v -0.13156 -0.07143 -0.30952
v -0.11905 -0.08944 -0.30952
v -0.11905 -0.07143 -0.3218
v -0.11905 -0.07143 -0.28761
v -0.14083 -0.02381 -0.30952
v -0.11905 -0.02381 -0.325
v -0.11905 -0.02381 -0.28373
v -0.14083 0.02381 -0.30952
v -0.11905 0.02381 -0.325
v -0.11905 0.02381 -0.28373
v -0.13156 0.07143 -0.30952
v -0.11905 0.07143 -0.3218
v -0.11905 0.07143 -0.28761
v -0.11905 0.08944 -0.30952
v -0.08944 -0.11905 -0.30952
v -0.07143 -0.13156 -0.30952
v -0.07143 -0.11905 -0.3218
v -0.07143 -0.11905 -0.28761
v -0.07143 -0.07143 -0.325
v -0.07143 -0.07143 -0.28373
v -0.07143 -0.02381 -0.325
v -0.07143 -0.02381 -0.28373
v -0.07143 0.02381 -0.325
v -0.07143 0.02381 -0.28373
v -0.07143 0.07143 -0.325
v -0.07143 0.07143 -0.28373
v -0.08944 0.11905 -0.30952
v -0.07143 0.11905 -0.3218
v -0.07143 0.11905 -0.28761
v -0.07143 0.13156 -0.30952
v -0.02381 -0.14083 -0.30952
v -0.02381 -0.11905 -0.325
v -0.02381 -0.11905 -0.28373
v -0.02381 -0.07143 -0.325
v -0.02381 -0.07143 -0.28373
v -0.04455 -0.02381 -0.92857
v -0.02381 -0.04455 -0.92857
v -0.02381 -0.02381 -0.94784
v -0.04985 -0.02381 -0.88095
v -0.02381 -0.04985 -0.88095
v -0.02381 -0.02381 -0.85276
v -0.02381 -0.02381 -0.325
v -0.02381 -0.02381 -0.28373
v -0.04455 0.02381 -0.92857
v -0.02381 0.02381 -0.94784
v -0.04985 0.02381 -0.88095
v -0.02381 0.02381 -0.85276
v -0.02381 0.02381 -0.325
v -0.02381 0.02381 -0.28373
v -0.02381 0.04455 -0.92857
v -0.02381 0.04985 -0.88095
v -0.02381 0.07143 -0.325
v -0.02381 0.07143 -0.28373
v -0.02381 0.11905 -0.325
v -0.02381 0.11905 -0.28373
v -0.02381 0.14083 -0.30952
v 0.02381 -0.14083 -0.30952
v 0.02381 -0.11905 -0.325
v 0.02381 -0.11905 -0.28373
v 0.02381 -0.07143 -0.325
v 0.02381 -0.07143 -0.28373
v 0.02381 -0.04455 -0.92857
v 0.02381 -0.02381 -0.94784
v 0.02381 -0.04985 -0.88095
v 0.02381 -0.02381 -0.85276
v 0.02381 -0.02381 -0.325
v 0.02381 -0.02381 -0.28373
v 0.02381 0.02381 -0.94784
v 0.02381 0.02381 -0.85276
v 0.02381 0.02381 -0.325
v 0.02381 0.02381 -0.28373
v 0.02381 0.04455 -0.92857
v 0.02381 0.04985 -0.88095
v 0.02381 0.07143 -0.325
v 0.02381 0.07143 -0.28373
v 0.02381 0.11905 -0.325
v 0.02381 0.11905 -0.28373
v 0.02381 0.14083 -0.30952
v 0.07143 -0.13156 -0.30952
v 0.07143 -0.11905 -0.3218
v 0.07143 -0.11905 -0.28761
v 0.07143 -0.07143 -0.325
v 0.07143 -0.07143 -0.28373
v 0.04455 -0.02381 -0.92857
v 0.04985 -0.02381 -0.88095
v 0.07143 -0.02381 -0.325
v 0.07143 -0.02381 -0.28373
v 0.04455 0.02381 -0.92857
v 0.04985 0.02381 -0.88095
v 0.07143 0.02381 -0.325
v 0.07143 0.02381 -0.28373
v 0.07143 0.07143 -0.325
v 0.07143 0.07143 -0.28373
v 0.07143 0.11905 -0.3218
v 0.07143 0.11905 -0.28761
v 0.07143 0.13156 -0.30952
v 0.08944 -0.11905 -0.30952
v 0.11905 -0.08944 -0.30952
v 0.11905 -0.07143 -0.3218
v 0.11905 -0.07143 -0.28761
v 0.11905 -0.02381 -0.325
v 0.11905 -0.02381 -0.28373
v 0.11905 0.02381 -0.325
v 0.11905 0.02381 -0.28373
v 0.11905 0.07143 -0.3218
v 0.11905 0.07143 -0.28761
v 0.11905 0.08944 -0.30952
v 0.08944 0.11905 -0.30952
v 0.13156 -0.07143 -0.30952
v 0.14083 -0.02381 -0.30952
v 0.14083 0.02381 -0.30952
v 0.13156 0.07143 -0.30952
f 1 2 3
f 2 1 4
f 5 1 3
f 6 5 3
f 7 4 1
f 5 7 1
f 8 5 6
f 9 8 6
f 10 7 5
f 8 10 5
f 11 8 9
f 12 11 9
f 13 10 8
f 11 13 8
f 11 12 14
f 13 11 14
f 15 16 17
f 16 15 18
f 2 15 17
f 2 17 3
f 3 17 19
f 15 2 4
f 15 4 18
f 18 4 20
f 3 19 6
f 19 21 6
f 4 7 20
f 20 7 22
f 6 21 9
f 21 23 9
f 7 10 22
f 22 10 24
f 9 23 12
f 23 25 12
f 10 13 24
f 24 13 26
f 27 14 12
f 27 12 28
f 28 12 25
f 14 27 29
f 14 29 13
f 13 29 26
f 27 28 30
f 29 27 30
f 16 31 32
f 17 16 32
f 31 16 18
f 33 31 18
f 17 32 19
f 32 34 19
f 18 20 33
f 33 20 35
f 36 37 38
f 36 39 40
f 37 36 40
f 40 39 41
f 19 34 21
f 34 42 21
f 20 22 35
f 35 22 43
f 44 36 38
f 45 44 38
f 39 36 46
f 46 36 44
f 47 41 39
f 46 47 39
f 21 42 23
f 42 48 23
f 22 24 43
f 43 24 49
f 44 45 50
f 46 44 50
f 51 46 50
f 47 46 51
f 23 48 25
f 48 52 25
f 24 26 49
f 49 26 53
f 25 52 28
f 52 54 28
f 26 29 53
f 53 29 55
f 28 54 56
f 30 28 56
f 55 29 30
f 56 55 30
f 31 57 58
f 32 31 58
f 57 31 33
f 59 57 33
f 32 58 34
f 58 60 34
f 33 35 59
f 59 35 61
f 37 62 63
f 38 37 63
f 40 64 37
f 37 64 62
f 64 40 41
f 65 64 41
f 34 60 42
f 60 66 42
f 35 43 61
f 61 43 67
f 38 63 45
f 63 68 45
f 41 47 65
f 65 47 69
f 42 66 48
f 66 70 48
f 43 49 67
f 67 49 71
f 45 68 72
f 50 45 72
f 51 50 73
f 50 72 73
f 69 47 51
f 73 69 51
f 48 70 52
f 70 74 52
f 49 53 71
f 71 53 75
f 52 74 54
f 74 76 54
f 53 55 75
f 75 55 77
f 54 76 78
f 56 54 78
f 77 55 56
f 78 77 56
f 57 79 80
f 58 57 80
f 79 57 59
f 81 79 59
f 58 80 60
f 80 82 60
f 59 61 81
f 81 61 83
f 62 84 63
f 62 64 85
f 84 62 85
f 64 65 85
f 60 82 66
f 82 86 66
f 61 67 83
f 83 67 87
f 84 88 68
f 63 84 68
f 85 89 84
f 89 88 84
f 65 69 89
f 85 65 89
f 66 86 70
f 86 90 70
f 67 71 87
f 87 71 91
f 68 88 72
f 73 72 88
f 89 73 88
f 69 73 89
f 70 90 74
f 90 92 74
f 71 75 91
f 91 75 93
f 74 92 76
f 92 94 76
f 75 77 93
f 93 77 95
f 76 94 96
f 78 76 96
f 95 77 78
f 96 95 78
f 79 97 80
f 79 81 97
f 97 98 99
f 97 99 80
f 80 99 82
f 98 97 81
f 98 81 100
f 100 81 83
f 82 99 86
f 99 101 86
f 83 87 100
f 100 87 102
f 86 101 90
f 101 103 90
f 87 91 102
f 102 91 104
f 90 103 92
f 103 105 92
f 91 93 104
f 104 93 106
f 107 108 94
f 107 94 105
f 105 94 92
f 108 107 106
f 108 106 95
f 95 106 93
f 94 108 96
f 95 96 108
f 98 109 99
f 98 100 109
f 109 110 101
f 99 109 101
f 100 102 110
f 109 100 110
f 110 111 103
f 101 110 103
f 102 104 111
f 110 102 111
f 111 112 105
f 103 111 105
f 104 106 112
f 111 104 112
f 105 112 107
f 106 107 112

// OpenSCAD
polyhedron(points=[
[-0.1315618242536274,-0.07142857142857162,-0.30952380952380953],
[-0.11904761904761907,-0.08943948291596926,-0.30952380952380953],
[-0.11904761904761907,-0.07142857142857162,-0.32180259341285344],
[-0.11904761904761907,-0.07142857142857162,-0.28760564894903284],
[-0.14082872299920957,-0.023809523809523947,-0.30952380952380953],
[-0.11904761904761907,-0.023809523809523947,-0.32500003633045016],
[-0.11904761904761907,-0.023809523809523947,-0.28373018900553393],
[-0.14082872299920957,0.023809523809523725,-0.30952380952380953],
[-0.11904761904761907,0.023809523809523725,-0.32500003633045016],
[-0.11904761904761907,0.023809523809523725,-0.28373018900553393],
[-0.1315618242536274,0.0714285714285714,-0.30952380952380953],
[-0.11904761904761907,0.0714285714285714,-0.32180259341285344],
[-0.11904761904761907,0.0714285714285714,-0.28760564894903284],
[-0.11904761904761907,0.08943957374209432,-0.30952380952380953],
[-0.08943948291596926,-0.11904761904761907,-0.30952380952380953],
[-0.07142857142857162,-0.1315618242536274,-0.30952380952380953],
[-0.07142857142857162,-0.11904761904761907,-0.32180259341285344],
[-0.07142857142857162,-0.11904761904761907,-0.28760564894903284],
[-0.07142857142857162,-0.07142857142857162,-0.32500003633045016],
[-0.07142857142857162,-0.07142857142857162,-0.28373018900553393],
[-0.07142857142857162,-0.023809523809523947,-0.32500003633045016],
[-0.07142857142857162,-0.023809523809523947,-0.28373018900553393],
[-0.07142857142857162,0.023809523809523725,-0.32500003633045016],
[-0.07142857142857162,0.023809523809523725,-0.28373018900553393],
[-0.07142857142857162,0.0714285714285714,-0.32500003633045016],
[-0.07142857142857162,0.0714285714285714,-0.28373018900553393],
[-0.08943948291596926,0.11904761904761907,-0.30952380952380953],
[-0.07142857142857162,0.11904761904761907,-0.32180259341285344],
[-0.07142857142857162,0.11904761904761907,-0.28760564894903284],
[-0.07142857142857162,0.13156182425362717,-0.30952380952380953],
[-0.023809523809523947,-0.14082872299920957,-0.30952380952380953],
[-0.023809523809523947,-0.11904761904761907,-0.32500003633045016],
[-0.023809523809523947,-0.11904761904761907,-0.28373018900553393],
[-0.023809523809523947,-0.07142857142857162,-0.32500003633045016],
[-0.023809523809523947,-0.07142857142857162,-0.28373018900553393],
[-0.04454803466796875,-0.023809523809523947,-0.9285714285714286],
[-0.023809523809523947,-0.04454803466796875,-0.9285714285714286],
[-0.023809523809523947,-0.023809523809523947,-0.9478431883312407],
[-0.0498484656924294,-0.023809523809523947,-0.8809523809523809],
[-0.023809523809523947,-0.0498484656924294,-0.8809523809523809],
[-0.023809523809523947,-0.023809523809523947,-0.8527604057675316],
[-0.023809523809523947,-0.023809523809523947,-0.32500003633045016],
[-0.023809523809523947,-0.023809523809523947,-0.28373018900553393],
[-0.04454803466796875,0.023809523809523725,-0.9285714285714286],
[-0.023809523809523947,0.023809523809523725,-0.9478431883312407],
[-0.0498484656924294,0.023809523809523725,-0.8809523809523809],
[-0.023809523809523947,0.023809523809523725,-0.8527604057675316],
[-0.023809523809523947,0.023809523809523725,-0.32500003633045016],
[-0.023809523809523947,0.023809523809523725,-0.28373018900553393],
[-0.023809523809523947,0.04454803466796875,-0.9285714285714286],
[-0.023809523809523947,0.04984846569242918,-0.8809523809523809],
[-0.023809523809523947,0.0714285714285714,-0.32500003633045016],
[-0.023809523809523947,0.0714285714285714,-0.28373018900553393],
[-0.023809523809523947,0.11904761904761907,-0.32500003633045016],
[-0.023809523809523947,0.11904761904761907,-0.28373018900553393],
[-0.023809523809523947,0.14082863217308406,-0.30952380952380953],
[0.023809523809523725,-0.14082872299920957,-0.30952380952380953],
[0.023809523809523725,-0.11904761904761907,-0.32500003633045016],
[0.023809523809523725,-0.11904761904761907,-0.28373018900553393],
[0.023809523809523725,-0.07142857142857162,-0.32500003633045016],
[0.023809523809523725,-0.07142857142857162,-0.28373018900553393],
[0.023809523809523725,-0.04454803466796875,-0.9285714285714286],
[0.023809523809523725,-0.023809523809523947,-0.9478431883312407],
[0.023809523809523725,-0.0498484656924294,-0.8809523809523809],
[0.023809523809523725,-0.023809523809523947,-0.8527604057675316],
[0.023809523809523725,-0.023809523809523947,-0.32500003633045016],
[0.023809523809523725,-0.023809523809523947,-0.28373018900553393],
[0.023809523809523725,0.023809523809523725,-0.9478431883312407],
[0.023809523809523725,0.023809523809523725,-0.8527604057675316],
[0.023809523809523725,0.023809523809523725,-0.32500003633045016],
[0.023809523809523725,0.023809523809523725,-0.28373018900553393],
[0.023809523809523725,0.04454803466796875,-0.9285714285714286],
[0.023809523809523725,0.04984846569242918,-0.8809523809523809],
[0.023809523809523725,0.0714285714285714,-0.32500003633045016],
[0.023809523809523725,0.0714285714285714,-0.28373018900553393],
[0.023809523809523725,0.11904761904761907,-0.32500003633045016],
[0.023809523809523725,0.11904761904761907,-0.28373018900553393],
[0.023809523809523725,0.14082863217308406,-0.30952380952380953],
[0.0714285714285714,-0.1315618242536274,-0.30952380952380953],
[0.0714285714285714,-0.11904761904761907,-0.32180259341285344],
[0.0714285714285714,-0.11904761904761907,-0.28760564894903284],
[0.0714285714285714,-0.07142857142857162,-0.32500003633045016],
[0.0714285714285714,-0.07142857142857162,-0.28373018900553393],
[0.04454803466796875,-0.023809523809523947,-0.9285714285714286],
[0.04984846569242918,-0.023809523809523947,-0.8809523809523809],
[0.0714285714285714,-0.023809523809523947,-0.32500003633045016],
[0.0714285714285714,-0.023809523809523947,-0.28373018900553393],
[0.04454803466796875,0.023809523809523725,-0.9285714285714286],
[0.04984846569242918,0.023809523809523725,-0.8809523809523809],
[0.0714285714285714,0.023809523809523725,-0.32500003633045016],
[0.0714285714285714,0.023809523809523725,-0.28373018900553393],
[0.0714285714285714,0.0714285714285714,-0.32500003633045016],
[0.0714285714285714,0.0714285714285714,-0.28373018900553393],
[0.0714285714285714,0.11904761904761907,-0.32180259341285344],
[0.0714285714285714,0.11904761904761907,-0.28760564894903284],
[0.0714285714285714,0.13156182425362717,-0.30952380952380953],
[0.08943957374209432,-0.11904761904761907,-0.30952380952380953],
[0.11904761904761907,-0.08943948291596926,-0.30952380952380953],
[0.11904761904761907,-0.07142857142857162,-0.32180259341285344],
[0.11904761904761907,-0.07142857142857162,-0.28760564894903284],
[0.11904761904761907,-0.023809523809523947,-0.32500003633045016],
[0.11904761904761907,-0.023809523809523947,-0.28373018900553393],
[0.11904761904761907,0.023809523809523725,-0.32500003633045016],
[0.11904761904761907,0.023809523809523725,-0.28373018900553393],
[0.11904761904761907,0.0714285714285714,-0.32180259341285344],
[0.11904761904761907,0.0714285714285714,-0.28760564894903284],
[0.11904761904761907,0.08943957374209432,-0.30952380952380953],
[0.08943957374209432,0.11904761904761907,-0.30952380952380953],
[0.13156182425362717,-0.07142857142857162,-0.30952380952380953],
[0.14082863217308406,-0.023809523809523947,-0.30952380952380953],
[0.14082863217308406,0.023809523809523725,-0.30952380952380953],
[0.13156182425362717,0.0714285714285714,-0.30952380952380953],
], faces=[
[2,1,0],
[3,0,1],
[2,0,4],
[2,4,5],
[0,3,6],
[0,6,4],
[5,4,7],
[5,7,8],
[4,6,9],
[4,9,7],
[8,7,10],
[8,10,11],
[7,9,12],
[7,12,10],
[13,11,10],
[13,10,12],
[16,15,14],
[17,14,15],
[16,14,1],
[2,16,1],
[18,16,2],
[3,1,14],
[17,3,14],
[19,3,17],
[5,18,2],
[5,20,18],
[19,6,3],
[21,6,19],
[8,20,5],
[8,22,20],
[21,9,6],
[23,9,21],
[11,22,8],
[11,24,22],
[23,12,9],
[25,12,23],
[11,13,26],
[27,11,26],
[24,11,27],
[28,26,13],
[12,28,13],
[25,28,12],
[29,27,26],
[29,26,28],
[31,30,15],
[31,15,16],
[17,15,30],
[17,30,32],
[18,31,16],
[18,33,31],
[32,19,17],
[34,19,32],
[37,36,35],
[39,38,35],
[39,35,36],
[40,38,39],
[20,33,18],
[20,41,33],
[34,21,19],
[42,21,34],
[37,35,43],
[37,43,44],
[45,35,38],
[43,35,45],
[38,40,46],
[38,46,45],
[22,41,20],
[22,47,41],
[42,23,21],
[48,23,42],
[49,44,43],
[49,43,45],
[49,45,50],
[50,45,46],
[24,47,22],
[24,51,47],
[48,25,23],
[52,25,48],
[27,51,24],
[27,53,51],
[52,28,25],
[54,28,52],
[55,53,27],
[55,27,29],
[29,28,54],
[29,54,55],
[57,56,30],
[57,30,31],
[32,30,56],
[32,56,58],
[33,57,31],
[33,59,57],
[58,34,32],
[60,34,58],
[62,61,36],
[62,36,37],
[36,63,39],
[61,63,36],
[40,39,63],
[40,63,64],
[41,59,33],
[41,65,59],
[60,42,34],
[66,42,60],
[44,62,37],
[44,67,62],
[64,46,40],
[68,46,64],
[47,65,41],
[47,69,65],
[66,48,42],
[70,48,66],
[71,67,44],
[71,44,49],
[72,49,50],
[72,71,49],
[50,46,68],
[50,68,72],
[51,69,47],
[51,73,69],
[70,52,48],
[74,52,70],
[53,73,51],
[53,75,73],
[74,54,52],
[76,54,74],
[77,75,53],
[77,53,55],
[55,54,76],
[55,76,77],
[79,78,56],
[79,56,57],
[58,56,78],
[58,78,80],
[59,79,57],
[59,81,79],
[80,60,58],
[82,60,80],
[62,83,61],
[84,63,61],
[84,61,83],
[84,64,63],
[65,81,59],
[65,85,81],
[82,66,60],
[86,66,82],
[67,87,83],
[67,83,62],
[83,88,84],
[83,87,88],
[88,68,64],
[88,64,84],
[69,85,65],
[69,89,85],
[86,70,66],
[90,70,86],
[71,87,67],
[87,71,72],
[87,72,88],
[88,72,68],
[73,89,69],
[73,91,89],
[90,74,70],
[92,74,90],
[75,91,73],
[75,93,91],
[92,76,74],
[94,76,92],
[95,93,75],
[95,75,77],
[77,76,94],
[77,94,95],
[79,96,78],
[96,80,78],
[98,97,96],
[79,98,96],
[81,98,79],
[80,96,97],
[99,80,97],
[82,80,99],
[85,98,81],
[85,100,98],
[99,86,82],
[101,86,99],
[89,100,85],
[89,102,100],
[101,90,86],
[103,90,101],
[91,102,89],
[91,104,102],
[103,92,90],
[105,92,103],
[93,107,106],
[104,93,106],
[91,93,104],
[105,106,107],
[94,105,107],
[92,105,94],
[95,107,93],
[107,95,94],
[98,108,97],
[108,99,97],
[100,109,108],
[100,108,98],
[109,101,99],
[109,99,108],
[102,110,109],
[102,109,100],
[110,103,101],
[110,101,109],
[104,111,110],
[104,110,102],
[111,105,103],
[111,103,110],
[106,111,104],
[111,106,105],
]);
